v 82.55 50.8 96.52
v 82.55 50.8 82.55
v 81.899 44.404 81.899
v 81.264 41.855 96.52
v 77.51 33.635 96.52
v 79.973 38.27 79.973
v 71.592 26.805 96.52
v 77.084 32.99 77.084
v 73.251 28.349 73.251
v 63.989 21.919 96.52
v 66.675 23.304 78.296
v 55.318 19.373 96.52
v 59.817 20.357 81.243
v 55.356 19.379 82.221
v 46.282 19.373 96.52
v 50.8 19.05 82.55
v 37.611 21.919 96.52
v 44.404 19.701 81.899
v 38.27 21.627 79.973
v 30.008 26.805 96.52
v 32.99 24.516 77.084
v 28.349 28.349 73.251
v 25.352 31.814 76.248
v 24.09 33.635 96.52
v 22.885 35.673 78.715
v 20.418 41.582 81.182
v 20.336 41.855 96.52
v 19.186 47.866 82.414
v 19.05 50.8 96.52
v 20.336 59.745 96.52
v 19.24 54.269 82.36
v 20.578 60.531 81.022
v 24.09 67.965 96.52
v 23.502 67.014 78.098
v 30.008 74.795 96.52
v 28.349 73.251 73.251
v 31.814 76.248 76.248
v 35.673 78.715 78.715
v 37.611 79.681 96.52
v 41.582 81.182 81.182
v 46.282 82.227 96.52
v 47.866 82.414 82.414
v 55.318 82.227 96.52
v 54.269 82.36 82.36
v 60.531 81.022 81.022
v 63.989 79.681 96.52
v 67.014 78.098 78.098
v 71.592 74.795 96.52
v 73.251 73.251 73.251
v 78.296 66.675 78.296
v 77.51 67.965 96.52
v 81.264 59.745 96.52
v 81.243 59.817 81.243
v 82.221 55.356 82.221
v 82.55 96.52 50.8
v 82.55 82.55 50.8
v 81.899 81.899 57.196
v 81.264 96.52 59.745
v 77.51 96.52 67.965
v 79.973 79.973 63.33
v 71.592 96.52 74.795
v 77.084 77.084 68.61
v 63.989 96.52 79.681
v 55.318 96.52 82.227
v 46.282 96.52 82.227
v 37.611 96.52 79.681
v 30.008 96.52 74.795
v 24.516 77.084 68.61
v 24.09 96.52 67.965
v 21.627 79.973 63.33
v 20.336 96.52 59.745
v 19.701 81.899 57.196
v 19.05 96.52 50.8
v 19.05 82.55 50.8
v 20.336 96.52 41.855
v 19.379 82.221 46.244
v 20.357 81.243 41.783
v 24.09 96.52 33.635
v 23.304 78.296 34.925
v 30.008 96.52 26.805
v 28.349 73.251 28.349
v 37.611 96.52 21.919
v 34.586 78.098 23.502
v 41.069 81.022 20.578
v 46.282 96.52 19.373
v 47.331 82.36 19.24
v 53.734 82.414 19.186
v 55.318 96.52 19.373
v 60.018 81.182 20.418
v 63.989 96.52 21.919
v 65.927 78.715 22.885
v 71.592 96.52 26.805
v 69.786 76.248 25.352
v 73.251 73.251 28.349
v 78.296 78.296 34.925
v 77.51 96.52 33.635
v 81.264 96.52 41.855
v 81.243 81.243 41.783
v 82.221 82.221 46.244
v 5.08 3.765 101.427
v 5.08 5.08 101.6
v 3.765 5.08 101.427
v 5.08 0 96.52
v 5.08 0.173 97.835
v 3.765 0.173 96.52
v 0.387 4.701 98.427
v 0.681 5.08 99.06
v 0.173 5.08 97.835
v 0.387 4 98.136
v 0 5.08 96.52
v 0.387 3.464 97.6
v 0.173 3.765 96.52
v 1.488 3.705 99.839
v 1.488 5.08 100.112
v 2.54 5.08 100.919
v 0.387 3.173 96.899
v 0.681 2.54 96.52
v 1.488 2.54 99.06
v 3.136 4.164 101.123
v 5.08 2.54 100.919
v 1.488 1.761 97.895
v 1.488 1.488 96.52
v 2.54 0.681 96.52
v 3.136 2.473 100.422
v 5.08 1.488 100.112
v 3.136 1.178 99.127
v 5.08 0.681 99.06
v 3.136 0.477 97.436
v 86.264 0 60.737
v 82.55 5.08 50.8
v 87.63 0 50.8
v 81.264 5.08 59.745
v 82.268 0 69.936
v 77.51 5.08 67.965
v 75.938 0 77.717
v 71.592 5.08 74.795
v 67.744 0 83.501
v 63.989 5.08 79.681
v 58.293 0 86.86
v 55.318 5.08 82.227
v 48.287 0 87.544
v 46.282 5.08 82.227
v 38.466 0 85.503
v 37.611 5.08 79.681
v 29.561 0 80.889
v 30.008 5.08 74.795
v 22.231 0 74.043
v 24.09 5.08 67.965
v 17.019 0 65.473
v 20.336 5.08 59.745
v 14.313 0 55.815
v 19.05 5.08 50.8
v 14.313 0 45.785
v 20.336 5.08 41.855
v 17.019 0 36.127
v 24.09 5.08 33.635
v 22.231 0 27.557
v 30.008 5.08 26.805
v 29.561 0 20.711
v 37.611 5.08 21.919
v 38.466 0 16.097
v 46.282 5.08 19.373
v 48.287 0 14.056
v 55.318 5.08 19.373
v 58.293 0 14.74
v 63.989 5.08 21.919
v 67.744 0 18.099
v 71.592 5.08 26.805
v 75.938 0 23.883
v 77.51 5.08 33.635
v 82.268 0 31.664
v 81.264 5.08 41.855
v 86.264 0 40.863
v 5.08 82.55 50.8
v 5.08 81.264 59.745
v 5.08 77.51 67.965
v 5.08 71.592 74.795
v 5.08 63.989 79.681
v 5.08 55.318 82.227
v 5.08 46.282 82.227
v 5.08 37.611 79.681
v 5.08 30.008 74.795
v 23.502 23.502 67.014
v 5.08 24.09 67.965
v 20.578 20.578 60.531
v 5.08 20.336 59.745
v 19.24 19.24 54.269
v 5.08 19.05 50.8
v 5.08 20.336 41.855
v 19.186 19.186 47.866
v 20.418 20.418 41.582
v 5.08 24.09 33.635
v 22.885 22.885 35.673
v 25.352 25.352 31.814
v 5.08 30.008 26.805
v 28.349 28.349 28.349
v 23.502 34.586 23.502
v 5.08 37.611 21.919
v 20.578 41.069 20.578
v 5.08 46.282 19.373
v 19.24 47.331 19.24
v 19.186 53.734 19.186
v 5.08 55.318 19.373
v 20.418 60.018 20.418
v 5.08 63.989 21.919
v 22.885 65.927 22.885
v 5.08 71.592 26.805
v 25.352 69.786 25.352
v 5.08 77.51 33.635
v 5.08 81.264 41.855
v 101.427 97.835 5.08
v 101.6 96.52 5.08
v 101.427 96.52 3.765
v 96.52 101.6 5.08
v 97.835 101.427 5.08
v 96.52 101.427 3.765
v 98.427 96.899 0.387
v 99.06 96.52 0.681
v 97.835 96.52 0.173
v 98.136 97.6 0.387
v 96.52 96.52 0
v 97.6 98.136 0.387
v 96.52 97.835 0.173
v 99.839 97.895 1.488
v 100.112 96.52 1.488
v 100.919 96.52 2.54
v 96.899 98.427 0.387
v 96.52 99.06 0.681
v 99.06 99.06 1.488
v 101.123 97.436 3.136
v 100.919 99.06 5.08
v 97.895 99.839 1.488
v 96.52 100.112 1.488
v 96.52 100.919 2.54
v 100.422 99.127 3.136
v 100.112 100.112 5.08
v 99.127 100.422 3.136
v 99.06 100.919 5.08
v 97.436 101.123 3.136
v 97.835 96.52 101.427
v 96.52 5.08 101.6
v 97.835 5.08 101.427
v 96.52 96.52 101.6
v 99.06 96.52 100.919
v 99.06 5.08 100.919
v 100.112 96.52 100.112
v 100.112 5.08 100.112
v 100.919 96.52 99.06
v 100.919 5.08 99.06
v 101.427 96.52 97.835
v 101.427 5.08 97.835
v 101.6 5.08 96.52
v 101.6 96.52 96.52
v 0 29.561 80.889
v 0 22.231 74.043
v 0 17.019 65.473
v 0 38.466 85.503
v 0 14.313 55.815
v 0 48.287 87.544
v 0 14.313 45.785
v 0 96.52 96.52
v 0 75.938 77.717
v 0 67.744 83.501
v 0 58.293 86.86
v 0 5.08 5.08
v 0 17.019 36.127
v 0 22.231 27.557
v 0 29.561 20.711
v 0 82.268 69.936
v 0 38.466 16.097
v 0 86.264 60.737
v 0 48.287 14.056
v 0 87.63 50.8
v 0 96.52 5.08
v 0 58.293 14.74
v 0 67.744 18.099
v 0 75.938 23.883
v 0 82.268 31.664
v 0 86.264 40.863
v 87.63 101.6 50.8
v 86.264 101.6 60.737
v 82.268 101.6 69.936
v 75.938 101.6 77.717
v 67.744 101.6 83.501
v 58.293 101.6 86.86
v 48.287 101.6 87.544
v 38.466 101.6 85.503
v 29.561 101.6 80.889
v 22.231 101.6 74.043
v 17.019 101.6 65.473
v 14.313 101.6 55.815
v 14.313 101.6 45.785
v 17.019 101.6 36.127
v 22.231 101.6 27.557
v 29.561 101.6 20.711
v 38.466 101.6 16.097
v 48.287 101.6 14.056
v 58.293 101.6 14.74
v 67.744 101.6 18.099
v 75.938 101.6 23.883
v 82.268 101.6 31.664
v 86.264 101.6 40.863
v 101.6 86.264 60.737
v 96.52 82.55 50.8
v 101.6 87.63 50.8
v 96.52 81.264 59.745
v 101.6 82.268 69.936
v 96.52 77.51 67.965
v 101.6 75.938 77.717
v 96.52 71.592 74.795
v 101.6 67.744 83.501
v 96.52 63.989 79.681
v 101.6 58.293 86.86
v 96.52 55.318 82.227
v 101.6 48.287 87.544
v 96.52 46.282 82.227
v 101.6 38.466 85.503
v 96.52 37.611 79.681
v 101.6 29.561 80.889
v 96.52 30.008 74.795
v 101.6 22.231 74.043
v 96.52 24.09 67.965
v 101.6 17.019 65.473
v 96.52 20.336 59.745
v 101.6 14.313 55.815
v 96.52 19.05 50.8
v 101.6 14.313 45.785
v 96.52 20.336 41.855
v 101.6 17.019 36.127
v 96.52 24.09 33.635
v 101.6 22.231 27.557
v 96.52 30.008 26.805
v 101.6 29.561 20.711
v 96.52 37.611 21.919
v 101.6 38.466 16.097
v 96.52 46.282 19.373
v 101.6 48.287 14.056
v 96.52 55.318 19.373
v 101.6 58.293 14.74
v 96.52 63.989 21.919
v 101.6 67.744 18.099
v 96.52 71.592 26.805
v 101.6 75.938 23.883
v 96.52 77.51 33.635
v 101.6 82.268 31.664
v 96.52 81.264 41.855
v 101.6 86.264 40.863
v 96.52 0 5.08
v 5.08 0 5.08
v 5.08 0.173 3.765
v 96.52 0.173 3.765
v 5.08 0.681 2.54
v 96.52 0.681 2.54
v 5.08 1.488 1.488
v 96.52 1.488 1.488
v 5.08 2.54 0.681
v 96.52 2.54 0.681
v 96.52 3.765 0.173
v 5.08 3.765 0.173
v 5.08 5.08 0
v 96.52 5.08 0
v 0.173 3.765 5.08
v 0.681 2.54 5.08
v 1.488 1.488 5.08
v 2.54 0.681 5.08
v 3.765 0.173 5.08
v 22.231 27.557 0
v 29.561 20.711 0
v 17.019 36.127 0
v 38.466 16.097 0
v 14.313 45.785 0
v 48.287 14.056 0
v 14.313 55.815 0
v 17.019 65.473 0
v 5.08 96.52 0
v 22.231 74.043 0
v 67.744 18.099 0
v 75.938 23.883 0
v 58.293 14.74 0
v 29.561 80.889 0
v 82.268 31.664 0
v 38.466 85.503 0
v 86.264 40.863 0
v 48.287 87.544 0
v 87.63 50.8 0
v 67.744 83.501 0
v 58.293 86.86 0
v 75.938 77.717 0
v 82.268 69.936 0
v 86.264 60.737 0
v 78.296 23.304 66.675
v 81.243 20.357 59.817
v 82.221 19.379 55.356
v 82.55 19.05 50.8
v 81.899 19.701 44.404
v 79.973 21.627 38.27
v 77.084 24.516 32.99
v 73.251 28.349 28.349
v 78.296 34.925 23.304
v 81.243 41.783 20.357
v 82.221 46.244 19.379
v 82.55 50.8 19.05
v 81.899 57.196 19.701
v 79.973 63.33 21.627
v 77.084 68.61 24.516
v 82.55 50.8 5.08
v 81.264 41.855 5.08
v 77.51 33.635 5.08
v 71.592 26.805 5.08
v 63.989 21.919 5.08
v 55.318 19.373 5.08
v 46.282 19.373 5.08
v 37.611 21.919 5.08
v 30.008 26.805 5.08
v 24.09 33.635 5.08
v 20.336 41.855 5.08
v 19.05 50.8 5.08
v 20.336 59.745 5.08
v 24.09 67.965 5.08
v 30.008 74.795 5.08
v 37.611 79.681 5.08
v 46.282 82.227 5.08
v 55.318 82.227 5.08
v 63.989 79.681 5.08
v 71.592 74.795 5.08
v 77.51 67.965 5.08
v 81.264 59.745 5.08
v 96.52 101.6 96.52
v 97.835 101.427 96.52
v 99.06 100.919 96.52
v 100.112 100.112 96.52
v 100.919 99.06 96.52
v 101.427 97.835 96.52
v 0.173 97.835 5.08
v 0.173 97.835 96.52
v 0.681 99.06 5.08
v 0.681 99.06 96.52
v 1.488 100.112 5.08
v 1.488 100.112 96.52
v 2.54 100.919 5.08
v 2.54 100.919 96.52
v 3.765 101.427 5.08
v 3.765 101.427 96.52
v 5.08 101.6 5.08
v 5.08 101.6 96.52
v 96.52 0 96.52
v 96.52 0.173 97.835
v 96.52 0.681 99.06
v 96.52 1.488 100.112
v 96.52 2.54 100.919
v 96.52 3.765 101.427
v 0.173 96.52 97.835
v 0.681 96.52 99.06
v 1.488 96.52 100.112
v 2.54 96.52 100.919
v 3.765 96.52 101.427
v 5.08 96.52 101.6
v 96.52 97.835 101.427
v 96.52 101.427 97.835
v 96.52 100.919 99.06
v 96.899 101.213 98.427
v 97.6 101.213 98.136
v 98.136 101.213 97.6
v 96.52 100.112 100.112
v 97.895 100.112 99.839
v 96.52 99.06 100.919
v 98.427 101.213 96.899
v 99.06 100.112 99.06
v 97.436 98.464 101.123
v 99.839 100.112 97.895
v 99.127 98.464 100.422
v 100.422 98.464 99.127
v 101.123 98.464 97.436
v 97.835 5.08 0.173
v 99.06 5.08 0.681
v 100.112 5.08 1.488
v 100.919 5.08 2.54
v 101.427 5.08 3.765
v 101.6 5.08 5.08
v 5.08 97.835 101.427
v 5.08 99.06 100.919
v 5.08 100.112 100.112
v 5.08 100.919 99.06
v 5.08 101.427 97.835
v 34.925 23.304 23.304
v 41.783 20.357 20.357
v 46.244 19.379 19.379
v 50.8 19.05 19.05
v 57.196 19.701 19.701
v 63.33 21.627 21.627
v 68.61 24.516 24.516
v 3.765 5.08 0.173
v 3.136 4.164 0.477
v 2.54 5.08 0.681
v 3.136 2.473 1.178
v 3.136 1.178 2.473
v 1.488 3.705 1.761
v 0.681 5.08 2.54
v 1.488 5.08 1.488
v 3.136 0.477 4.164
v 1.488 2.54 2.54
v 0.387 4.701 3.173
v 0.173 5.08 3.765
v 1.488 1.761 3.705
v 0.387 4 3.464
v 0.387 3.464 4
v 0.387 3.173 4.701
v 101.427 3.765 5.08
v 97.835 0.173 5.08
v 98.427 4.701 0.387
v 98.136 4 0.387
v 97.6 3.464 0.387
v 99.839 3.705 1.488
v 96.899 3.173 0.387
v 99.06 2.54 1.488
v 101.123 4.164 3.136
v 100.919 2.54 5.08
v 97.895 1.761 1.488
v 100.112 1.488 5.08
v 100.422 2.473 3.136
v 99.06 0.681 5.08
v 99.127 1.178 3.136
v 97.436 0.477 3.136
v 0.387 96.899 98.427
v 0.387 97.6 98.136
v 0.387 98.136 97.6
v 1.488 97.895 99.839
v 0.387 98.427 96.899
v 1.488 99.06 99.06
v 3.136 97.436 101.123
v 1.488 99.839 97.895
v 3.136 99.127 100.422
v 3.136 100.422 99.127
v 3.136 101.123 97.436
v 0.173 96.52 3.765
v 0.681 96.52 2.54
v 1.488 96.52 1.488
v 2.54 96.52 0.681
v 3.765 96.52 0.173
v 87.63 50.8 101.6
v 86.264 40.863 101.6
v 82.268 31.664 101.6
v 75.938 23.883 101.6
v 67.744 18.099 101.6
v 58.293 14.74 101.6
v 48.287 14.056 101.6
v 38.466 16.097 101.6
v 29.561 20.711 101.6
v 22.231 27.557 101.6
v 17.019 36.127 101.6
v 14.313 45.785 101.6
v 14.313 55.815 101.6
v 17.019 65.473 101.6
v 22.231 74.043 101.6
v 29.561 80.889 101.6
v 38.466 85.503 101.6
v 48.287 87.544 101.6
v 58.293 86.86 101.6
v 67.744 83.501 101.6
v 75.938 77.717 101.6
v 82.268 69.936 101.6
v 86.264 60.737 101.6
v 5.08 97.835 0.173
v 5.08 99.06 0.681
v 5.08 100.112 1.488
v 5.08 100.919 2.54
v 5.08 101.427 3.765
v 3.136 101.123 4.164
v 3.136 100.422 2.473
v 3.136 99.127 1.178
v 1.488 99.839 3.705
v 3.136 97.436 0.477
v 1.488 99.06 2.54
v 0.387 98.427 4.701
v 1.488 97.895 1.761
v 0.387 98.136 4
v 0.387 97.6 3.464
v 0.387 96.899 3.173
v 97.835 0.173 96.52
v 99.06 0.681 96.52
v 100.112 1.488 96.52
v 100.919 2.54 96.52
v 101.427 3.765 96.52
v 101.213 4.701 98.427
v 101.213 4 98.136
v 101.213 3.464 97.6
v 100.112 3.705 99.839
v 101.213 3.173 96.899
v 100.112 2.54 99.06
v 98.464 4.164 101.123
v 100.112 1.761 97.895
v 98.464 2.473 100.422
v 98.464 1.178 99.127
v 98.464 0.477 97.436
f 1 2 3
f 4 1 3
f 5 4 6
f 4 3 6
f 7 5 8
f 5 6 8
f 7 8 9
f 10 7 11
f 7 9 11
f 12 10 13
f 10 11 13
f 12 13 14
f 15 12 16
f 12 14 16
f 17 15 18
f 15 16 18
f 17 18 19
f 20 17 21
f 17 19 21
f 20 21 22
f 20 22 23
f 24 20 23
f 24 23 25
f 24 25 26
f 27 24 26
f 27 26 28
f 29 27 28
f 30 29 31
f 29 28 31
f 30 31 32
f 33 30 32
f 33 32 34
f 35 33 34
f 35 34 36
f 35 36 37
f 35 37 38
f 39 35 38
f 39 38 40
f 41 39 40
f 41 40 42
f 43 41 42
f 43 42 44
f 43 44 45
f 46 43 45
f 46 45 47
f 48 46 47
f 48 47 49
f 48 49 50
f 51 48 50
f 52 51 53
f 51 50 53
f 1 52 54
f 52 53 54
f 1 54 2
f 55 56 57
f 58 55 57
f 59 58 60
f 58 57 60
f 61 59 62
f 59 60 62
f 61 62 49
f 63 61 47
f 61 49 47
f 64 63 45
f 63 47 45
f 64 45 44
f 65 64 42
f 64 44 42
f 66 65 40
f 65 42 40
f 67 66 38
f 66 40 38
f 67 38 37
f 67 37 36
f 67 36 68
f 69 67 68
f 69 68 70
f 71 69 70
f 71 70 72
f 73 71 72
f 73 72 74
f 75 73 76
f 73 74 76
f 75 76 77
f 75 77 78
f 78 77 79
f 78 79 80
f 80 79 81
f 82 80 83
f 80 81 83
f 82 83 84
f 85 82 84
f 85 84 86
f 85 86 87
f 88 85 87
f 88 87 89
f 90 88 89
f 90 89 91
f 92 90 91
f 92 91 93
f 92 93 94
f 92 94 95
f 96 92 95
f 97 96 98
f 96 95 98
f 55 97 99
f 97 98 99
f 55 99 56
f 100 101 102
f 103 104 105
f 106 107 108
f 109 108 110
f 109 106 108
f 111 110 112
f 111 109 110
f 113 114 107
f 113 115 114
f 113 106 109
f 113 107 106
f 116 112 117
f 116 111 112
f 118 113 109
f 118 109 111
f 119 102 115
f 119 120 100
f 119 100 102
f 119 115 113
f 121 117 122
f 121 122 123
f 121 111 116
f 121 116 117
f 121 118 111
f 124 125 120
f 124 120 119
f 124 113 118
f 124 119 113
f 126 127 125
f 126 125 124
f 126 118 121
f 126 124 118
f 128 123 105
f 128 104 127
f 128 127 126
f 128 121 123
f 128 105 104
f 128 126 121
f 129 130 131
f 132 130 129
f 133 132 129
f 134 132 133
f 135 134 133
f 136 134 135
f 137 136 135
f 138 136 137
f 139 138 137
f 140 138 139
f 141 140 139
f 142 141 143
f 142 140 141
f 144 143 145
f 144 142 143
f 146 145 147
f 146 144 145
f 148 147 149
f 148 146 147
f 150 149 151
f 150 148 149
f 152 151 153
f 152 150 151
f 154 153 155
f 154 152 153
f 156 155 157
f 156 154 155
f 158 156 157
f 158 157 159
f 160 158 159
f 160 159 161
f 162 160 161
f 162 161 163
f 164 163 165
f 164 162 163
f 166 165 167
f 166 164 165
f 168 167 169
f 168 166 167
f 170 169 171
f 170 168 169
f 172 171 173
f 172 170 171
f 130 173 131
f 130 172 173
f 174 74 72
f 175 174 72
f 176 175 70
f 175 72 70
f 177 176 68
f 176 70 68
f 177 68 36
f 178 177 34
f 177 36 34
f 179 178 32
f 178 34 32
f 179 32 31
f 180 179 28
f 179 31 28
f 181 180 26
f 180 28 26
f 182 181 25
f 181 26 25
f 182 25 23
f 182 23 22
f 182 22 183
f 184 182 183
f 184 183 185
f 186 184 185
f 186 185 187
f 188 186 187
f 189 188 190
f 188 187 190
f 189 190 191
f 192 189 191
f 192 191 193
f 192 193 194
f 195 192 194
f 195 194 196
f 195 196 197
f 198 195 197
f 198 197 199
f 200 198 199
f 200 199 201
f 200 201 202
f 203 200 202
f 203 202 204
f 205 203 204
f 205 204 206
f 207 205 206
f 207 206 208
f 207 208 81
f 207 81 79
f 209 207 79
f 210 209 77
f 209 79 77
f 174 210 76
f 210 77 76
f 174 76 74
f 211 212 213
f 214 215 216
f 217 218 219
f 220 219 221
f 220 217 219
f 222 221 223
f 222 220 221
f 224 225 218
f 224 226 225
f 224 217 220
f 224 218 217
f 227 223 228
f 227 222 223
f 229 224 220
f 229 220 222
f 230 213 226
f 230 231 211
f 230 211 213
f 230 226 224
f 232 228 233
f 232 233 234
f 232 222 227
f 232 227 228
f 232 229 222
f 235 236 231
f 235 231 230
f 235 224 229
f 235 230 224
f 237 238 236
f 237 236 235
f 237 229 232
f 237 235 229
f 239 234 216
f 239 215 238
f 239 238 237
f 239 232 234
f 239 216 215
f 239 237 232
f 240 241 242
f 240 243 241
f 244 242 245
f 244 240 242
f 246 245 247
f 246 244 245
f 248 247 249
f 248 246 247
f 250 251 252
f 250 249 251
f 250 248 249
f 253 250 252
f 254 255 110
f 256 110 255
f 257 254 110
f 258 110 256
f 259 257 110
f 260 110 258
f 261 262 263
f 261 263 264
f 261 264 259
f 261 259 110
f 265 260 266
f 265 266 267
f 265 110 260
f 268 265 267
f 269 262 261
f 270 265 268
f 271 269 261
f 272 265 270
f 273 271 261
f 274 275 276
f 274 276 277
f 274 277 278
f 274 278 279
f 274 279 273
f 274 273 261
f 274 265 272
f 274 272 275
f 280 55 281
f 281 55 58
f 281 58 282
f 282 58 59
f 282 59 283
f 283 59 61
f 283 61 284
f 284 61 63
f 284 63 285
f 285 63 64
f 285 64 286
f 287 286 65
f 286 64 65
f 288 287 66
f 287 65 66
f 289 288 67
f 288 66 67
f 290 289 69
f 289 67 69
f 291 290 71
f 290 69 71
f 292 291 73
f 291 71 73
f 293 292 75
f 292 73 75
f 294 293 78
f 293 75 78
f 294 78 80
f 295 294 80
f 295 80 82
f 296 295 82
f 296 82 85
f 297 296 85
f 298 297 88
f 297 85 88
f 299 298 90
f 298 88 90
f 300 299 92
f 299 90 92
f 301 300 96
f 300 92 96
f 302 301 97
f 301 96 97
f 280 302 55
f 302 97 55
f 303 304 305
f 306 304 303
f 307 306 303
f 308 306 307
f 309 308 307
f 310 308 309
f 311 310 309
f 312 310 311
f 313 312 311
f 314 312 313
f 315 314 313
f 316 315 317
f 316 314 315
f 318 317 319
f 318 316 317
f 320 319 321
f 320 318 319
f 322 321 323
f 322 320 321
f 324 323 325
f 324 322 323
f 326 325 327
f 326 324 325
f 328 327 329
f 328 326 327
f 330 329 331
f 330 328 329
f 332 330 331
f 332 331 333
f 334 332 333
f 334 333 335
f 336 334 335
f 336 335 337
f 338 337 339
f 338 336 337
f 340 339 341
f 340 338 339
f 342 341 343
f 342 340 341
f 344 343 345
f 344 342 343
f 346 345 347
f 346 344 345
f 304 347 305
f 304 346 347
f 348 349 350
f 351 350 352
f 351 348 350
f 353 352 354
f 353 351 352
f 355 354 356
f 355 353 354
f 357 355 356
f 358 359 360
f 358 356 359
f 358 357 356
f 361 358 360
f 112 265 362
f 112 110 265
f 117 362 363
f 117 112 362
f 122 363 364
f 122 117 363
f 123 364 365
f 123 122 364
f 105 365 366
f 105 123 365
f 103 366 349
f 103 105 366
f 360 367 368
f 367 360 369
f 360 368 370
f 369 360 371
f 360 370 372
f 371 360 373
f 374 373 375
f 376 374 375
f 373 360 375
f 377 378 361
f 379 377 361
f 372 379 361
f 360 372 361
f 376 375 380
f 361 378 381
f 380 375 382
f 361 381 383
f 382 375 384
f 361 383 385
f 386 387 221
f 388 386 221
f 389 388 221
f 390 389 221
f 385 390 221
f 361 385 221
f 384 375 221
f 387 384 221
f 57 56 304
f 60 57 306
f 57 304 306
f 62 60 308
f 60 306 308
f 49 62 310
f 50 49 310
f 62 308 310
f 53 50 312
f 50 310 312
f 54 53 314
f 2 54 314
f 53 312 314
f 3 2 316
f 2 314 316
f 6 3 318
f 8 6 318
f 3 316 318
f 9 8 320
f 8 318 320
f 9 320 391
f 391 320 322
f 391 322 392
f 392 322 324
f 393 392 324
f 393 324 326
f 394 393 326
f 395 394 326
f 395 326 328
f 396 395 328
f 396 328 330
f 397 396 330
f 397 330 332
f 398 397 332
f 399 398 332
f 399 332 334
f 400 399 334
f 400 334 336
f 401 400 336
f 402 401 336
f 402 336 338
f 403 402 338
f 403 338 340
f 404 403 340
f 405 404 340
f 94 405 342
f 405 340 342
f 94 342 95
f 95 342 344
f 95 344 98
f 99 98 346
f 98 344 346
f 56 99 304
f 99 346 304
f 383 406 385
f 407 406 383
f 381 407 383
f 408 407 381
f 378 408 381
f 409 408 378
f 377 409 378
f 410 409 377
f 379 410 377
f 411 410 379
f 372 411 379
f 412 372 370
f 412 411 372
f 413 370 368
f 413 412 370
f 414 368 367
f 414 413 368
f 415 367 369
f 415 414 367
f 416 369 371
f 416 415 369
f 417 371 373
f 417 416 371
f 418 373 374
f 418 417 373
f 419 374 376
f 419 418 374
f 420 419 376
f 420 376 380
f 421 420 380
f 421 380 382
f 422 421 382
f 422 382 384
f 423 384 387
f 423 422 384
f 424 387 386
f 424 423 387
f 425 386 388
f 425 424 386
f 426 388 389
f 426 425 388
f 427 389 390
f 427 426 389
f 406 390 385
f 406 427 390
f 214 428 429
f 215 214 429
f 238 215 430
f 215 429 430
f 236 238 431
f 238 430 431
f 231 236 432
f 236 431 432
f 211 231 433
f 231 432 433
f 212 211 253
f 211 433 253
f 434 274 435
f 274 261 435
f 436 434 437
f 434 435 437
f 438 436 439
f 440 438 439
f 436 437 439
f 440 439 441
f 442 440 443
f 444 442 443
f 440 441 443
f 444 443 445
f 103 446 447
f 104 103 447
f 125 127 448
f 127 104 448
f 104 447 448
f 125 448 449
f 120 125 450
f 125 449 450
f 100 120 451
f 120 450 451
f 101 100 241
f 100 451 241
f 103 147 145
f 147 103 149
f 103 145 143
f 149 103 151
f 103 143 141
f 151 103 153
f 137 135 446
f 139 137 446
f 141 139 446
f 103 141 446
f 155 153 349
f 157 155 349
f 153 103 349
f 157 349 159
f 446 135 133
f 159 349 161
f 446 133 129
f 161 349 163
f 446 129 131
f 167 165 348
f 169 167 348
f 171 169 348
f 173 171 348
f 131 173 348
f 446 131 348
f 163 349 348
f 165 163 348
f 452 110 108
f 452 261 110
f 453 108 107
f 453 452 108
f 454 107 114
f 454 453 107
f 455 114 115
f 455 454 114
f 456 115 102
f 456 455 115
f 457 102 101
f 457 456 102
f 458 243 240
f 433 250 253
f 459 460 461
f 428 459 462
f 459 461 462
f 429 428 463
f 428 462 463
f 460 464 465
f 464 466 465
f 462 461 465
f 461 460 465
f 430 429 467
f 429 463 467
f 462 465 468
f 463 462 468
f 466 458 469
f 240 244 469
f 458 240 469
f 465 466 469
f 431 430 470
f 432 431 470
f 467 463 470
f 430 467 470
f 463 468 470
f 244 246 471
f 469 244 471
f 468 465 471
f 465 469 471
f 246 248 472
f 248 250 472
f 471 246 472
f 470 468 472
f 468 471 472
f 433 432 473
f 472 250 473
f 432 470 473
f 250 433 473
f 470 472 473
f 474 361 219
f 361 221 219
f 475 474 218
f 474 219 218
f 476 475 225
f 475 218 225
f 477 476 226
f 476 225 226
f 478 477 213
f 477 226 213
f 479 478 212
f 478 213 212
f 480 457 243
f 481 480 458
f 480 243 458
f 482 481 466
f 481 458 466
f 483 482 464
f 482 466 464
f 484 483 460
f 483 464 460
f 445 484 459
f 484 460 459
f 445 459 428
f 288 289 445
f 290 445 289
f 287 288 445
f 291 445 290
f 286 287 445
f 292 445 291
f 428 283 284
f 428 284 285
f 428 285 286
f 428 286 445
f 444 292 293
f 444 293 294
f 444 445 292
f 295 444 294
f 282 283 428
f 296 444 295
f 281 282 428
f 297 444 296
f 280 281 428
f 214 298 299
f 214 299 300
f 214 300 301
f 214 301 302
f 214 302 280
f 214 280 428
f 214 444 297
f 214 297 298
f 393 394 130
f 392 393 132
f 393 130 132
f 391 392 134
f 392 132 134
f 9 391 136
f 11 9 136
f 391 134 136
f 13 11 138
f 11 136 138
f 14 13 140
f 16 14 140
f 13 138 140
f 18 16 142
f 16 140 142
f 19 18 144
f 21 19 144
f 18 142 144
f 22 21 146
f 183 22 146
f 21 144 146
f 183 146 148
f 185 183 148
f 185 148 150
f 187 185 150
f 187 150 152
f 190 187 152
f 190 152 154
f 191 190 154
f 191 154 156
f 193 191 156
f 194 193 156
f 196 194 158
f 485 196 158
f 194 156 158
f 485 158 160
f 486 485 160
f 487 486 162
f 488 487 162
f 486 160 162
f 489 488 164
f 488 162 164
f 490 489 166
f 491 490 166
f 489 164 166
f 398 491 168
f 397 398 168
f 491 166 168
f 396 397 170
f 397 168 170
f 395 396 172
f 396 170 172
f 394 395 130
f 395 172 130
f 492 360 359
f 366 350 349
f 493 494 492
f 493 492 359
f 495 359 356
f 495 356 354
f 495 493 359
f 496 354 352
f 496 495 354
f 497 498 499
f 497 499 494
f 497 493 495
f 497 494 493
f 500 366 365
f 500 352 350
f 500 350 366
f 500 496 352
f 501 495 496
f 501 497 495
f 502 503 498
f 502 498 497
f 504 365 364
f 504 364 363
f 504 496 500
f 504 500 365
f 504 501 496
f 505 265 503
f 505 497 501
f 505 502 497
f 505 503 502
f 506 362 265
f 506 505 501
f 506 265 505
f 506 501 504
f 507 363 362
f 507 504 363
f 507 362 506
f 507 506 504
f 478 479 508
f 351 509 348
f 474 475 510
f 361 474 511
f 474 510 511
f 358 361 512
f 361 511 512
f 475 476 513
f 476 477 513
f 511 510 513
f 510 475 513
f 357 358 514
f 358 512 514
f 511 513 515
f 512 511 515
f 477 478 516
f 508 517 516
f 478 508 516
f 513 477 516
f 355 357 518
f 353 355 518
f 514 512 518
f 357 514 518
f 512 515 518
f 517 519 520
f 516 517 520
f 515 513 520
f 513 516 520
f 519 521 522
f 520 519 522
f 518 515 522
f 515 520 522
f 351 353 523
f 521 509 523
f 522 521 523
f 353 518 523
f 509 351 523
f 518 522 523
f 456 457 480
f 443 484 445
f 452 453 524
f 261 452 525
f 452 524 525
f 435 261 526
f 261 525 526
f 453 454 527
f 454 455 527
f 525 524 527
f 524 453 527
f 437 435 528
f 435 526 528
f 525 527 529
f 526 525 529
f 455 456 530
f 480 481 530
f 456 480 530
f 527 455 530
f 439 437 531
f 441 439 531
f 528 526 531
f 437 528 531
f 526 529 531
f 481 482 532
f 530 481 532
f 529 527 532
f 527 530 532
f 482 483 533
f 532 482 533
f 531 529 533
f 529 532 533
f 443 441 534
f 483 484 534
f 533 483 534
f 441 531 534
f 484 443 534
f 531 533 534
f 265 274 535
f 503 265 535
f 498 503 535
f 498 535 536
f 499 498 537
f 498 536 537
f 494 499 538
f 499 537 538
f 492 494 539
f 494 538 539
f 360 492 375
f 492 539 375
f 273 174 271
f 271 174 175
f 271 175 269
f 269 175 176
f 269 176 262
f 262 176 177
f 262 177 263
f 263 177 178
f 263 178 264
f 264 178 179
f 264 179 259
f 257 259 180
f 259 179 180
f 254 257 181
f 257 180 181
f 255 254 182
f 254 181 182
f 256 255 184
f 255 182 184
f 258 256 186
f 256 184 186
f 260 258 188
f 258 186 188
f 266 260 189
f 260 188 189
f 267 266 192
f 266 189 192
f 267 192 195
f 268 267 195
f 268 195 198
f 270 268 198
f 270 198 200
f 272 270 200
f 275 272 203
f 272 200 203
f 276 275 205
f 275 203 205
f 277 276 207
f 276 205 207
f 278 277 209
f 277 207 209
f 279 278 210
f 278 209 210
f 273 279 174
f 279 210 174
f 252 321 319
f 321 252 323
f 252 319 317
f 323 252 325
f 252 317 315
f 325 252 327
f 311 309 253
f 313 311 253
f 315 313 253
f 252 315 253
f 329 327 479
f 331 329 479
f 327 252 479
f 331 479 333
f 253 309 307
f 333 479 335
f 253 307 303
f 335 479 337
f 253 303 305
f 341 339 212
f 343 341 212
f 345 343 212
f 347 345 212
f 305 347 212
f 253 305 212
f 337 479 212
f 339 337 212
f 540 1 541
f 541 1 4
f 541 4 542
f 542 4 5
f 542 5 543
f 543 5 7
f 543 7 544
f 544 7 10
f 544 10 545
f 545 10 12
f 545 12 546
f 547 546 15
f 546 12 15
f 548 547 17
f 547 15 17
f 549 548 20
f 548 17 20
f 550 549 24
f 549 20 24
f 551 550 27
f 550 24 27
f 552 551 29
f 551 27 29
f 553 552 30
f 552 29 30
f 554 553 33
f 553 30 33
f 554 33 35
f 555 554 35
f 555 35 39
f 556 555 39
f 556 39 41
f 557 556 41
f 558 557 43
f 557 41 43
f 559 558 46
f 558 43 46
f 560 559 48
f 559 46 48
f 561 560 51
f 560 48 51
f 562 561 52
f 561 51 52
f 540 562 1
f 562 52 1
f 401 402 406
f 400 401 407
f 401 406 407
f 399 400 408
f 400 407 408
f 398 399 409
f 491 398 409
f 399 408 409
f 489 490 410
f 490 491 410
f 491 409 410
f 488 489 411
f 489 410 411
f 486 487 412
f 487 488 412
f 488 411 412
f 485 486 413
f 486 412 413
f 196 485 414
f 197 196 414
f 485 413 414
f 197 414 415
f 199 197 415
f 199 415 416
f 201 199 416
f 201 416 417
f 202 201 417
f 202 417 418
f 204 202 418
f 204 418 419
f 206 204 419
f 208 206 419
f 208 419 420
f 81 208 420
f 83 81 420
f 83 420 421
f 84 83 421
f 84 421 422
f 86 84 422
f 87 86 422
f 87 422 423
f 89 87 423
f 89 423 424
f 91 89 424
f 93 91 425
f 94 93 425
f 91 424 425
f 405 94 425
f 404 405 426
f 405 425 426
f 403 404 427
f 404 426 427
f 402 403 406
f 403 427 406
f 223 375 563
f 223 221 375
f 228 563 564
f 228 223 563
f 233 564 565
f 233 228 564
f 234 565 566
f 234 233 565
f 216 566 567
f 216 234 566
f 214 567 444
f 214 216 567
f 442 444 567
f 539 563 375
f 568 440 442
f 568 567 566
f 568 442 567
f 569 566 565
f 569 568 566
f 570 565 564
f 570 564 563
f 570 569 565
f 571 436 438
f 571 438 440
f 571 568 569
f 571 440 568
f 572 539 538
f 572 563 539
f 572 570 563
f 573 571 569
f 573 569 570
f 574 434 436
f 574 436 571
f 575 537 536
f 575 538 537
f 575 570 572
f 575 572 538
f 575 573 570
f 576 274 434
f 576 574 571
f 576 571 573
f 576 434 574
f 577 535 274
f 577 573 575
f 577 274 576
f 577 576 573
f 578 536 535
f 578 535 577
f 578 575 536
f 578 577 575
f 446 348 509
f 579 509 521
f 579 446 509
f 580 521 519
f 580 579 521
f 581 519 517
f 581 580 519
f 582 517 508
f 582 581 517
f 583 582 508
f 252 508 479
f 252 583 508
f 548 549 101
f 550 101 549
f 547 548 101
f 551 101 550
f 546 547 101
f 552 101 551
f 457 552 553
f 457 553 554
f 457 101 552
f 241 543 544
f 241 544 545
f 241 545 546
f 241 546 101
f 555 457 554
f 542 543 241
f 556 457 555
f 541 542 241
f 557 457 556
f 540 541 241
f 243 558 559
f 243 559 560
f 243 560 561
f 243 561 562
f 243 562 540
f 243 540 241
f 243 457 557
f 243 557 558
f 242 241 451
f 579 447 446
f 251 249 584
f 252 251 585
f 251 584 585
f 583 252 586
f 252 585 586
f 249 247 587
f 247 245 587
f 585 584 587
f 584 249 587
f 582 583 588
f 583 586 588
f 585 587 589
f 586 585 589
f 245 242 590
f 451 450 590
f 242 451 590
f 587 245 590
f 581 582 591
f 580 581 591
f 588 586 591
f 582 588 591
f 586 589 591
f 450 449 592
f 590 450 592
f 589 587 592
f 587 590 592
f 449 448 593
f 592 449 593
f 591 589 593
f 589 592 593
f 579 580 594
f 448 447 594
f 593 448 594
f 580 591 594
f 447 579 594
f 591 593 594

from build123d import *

# Parameters (mm, degrees)
F0_W         = 101.6
F0_H         = 101.6
F1_DEPTH     = 101.6
F2_R         = 31.75
F1_FACE1_W   = 101.6
F1_FACE1_H   = 101.6
F3_DEPTH     = 101.6
F4_R         = 31.75
F5_DEPTH     = 101.6
F6_R         = 31.75
F7_DEPTH     = 101.6
F8_R         = 5.08
F9_T1_DEPTH  = 91.44
F9_S5_W      = 5.08
F9_S5_H      = 5.08
F9_T6_DEPTH  = 5.08
F9_S11_W     = 5.08
F9_S11_H     = 5.08
F9_T12_DEPTH = 5.08
F10_SIZE     = 5.08


# Not quite as in the source:
# - a fillet or chamfer that OpenCascade refuses, or shapes differently, is made with other operations: its cross-section is extruded or revolved along the edge and cut away or added


with BuildPart() as f1:
    # F0 (on Top) → F1 (new body)
    with BuildSketch(Plane.XY):
        with Locations((50.8, 50.8)):
            Rectangle(F0_W, F0_H)
    extrude(amount=F1_DEPTH)

    # F2 (on face) + F1_face1 (on face) → F3 (cut)
    with BuildSketch(Plane.YZ.offset(101.6)):
        with Locations((50.8, 50.8)):
            Circle(F2_R)
    with BuildSketch(Plane(origin=(0, 50.8, 50.8), x_dir=(0, -1, 0), z_dir=(-1, 0, 0))):
        Rectangle(F1_FACE1_W, F1_FACE1_H)
    extrude(amount=-F3_DEPTH, dir=(1, 0, 0), mode=Mode.SUBTRACT)

    # F4 (on face) → F5 (cut)
    with BuildSketch(Plane.XZ):
        with Locations((50.8, 50.8)):
            Circle(F4_R)
    extrude(amount=-F5_DEPTH, mode=Mode.SUBTRACT)

    # F6 (on face) → F7 (cut)
    with BuildSketch(Plane(origin=(0, 0, 0), x_dir=(1, 0, 0), z_dir=(0, 0, -1))):
        with Locations((50.8, -50.8)):
            Circle(F6_R)
    extrude(amount=-F7_DEPTH, mode=Mode.SUBTRACT)

    # F8
    f8_edges = [f1.edges().sort_by_distance(p)[0] for p in [
        (50.8, 0, 101.6),
        (101.6, 50.8, 101.6),
        (50.8, 101.6, 101.6),
        (0, 50.8, 101.6),
        (101.6, 101.6, 50.8),
        (101.6, 0, 50.8),
        (101.6, 50.8, 0),
        (50.8, 101.6, 0),
        (0, 101.6, 50.8),
        (50.8, 0, 0),
        (0, 0, 50.8),
    ]]
    fillet(f8_edges, radius=F8_R)

    # F9: fillet of radius 5.08 on 1 edges, made by hand

    # F9_s2 → F9_t1 (cut)
    with BuildSketch(Plane.XZ.offset(-96.52)):
        with BuildLine():
            ThreePointArc((0, 5.08), (1.4878975516, 1.4878975516), (5.08, 0))
            Line((5.08, 0), (0, 0))
            Line((0, 0), (0, 5.08))
        make_face()
    extrude(amount=F9_T1_DEPTH, mode=Mode.SUBTRACT)


with BuildPart() as f9_tool4:
    # F9_s5 → F9_t6 (new body)
    with BuildSketch(Plane.YZ.offset(5.08)):
        with Locations((99.06, 2.54)):
            Rectangle(F9_S5_W, F9_S5_H)
    extrude(amount=-F9_T6_DEPTH)

    # F9_s7 → F9_t8 (revolve, cut)
    with BuildSketch(Plane(origin=(5.08, 96.52, 5.08), x_dir=(0, -0.7071067812, 0.7071067812), z_dir=(0, -0.7071067812, -0.7071067812))):
        with BuildLine():
            ThreePointArc((0, -5.08), (5.08, 0), (0, 5.08))
            Line((0, 5.08), (0, -5.08))
        make_face()
    revolve(axis=Axis((5.08, 96.52, 5.08), (-1, 0, 0)), mode=Mode.SUBTRACT)


with BuildPart() as f1_1:
    add(f1.part)

    # F9_t3: cut F9_tool4
    add(f9_tool4.part, mode=Mode.SUBTRACT)


with BuildPart() as f9_tool10:
    # F9_s11 → F9_t12 (new body)
    with BuildSketch(Plane.YZ.offset(5.08)):
        with Locations((2.54, 2.54)):
            Rectangle(F9_S11_W, F9_S11_H)
    extrude(amount=-F9_T12_DEPTH)

    # F9_s13 → F9_t14 (revolve, cut)
    with BuildSketch(Plane(origin=(5.08, 5.08, 5.08), x_dir=(0, 0.7071067812, 0.7071067812), z_dir=(0, -0.7071067812, 0.7071067812))):
        with BuildLine():
            ThreePointArc((0, -5.08), (5.08, 0), (0, 5.08))
            Line((0, 5.08), (0, -5.08))
        make_face()
    revolve(axis=Axis((5.08, 5.08, 5.08), (-1, 0, 0)), mode=Mode.SUBTRACT)


with BuildPart() as f1_2:
    add(f1_1.part)

    # F9_t9: cut F9_tool10
    add(f9_tool10.part, mode=Mode.SUBTRACT)

    # F10
    f10_edges = [f1_2.edges().sort_by_distance(p)[0] for p in [
        (101.6, 19.05, 50.8),
        (0, 19.05, 50.8),
        (19.05, 50.8, 0),
        (19.05, 0, 50.8),
        (19.05, 50.8, 101.6),
        (19.05, 101.6, 50.8),
    ]]
    chamfer(f10_edges, length=F10_SIZE)


solid = f1_2.part
